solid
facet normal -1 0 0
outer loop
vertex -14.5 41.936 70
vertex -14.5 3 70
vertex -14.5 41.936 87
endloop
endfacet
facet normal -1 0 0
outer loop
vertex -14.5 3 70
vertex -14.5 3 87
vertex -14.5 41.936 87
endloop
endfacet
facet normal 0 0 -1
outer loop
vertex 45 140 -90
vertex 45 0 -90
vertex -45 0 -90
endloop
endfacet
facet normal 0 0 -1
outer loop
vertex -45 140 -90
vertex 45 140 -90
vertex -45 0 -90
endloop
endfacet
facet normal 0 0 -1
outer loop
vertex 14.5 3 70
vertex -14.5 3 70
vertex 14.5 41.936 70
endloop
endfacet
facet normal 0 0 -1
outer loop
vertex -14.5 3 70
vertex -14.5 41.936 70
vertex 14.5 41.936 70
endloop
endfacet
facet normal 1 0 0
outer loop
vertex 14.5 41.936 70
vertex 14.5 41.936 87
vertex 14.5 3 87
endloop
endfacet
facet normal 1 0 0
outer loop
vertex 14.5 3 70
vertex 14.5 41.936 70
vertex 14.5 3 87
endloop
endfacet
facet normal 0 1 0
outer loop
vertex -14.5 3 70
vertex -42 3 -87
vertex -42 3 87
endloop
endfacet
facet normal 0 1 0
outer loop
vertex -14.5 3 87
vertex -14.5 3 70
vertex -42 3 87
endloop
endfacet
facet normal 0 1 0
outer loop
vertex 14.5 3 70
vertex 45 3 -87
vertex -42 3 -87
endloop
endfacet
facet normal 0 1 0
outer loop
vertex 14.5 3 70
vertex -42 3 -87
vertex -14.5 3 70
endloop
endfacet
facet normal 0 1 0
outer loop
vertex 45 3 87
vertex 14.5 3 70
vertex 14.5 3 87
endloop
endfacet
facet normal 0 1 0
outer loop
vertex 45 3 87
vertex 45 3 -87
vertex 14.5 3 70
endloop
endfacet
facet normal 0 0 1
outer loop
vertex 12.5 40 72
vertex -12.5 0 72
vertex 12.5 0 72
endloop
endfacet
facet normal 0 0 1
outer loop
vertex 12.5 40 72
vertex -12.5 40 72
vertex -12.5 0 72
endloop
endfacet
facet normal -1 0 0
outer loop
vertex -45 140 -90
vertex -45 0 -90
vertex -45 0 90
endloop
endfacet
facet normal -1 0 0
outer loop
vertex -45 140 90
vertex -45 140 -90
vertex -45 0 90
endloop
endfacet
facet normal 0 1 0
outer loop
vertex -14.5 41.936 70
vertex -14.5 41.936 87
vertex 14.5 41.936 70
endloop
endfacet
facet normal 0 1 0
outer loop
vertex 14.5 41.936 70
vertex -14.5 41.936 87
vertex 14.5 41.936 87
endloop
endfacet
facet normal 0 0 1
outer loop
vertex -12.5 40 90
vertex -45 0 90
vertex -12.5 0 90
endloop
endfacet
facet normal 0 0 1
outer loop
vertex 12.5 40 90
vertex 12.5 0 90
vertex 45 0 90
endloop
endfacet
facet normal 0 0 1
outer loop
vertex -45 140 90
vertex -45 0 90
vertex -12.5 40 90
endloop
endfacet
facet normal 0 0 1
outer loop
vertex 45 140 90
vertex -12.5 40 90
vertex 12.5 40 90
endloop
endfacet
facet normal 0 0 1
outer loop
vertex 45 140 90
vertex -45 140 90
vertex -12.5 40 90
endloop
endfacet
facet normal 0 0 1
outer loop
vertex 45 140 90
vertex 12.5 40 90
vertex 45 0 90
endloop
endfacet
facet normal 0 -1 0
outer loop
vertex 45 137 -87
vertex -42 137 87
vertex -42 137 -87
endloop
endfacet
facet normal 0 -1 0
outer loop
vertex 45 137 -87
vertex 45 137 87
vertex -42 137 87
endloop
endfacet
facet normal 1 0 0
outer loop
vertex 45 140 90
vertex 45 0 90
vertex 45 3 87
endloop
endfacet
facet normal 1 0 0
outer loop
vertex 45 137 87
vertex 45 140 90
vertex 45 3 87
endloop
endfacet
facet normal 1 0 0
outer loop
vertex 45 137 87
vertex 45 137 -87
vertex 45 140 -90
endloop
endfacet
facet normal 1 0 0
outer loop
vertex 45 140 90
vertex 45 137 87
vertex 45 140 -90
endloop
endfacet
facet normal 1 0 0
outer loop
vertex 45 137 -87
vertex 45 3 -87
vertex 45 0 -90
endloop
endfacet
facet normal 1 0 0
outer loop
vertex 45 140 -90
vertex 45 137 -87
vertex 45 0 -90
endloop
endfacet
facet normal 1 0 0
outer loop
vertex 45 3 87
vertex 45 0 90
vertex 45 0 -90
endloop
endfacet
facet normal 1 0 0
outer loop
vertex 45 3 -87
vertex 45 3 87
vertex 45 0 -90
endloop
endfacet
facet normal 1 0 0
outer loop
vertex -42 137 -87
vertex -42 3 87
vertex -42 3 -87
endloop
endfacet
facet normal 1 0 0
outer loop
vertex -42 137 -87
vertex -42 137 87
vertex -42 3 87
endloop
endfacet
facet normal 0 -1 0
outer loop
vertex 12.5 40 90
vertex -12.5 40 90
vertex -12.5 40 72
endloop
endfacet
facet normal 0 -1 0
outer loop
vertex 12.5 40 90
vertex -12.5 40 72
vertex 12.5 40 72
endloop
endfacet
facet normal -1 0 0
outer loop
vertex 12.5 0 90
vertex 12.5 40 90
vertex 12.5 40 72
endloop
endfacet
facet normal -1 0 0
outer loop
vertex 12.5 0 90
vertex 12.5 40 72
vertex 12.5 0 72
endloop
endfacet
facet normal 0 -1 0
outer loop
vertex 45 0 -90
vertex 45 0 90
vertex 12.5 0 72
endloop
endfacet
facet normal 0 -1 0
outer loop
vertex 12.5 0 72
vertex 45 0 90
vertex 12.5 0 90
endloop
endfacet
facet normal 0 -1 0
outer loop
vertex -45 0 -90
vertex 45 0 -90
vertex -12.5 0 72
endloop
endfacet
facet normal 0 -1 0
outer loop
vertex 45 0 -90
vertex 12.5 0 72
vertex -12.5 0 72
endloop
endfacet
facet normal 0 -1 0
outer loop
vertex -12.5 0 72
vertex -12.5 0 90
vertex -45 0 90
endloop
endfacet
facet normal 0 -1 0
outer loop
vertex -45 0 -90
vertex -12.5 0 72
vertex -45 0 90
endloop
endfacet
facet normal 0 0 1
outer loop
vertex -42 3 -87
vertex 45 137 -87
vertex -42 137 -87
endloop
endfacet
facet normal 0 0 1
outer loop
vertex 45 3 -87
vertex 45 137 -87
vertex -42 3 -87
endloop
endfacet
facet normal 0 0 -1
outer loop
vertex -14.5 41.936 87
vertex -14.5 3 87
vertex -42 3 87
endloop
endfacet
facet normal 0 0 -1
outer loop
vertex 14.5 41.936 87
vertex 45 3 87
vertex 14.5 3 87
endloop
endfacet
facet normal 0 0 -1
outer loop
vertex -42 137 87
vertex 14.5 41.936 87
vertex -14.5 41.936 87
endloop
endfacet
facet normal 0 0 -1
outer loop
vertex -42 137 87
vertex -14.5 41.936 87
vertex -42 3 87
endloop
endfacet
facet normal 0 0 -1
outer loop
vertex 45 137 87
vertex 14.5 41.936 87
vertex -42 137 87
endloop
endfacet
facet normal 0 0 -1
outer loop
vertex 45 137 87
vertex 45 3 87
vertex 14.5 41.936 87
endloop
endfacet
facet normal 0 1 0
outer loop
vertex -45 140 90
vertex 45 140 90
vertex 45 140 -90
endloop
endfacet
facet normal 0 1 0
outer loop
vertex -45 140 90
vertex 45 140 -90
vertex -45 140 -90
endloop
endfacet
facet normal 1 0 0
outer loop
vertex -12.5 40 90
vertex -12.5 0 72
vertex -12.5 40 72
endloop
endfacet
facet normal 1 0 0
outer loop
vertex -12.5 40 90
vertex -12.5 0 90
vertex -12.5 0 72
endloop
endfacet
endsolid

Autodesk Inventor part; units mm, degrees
ref_plane "YZ Plane" through (0, 0, 0) normal (1, 0, 0) x (0, 1, 0)
ref_plane "XZ Plane" through (0, 0, 0) normal (0, 1, 0) x (-1, 0, 0)
ref_plane "XY Plane" through (0, 0, 0) normal (0, 0, 1) x (1, 0, 0)
sketch "Sketch1" plane through (0, 0, 0) normal (0, 1, 0) x (-1, 0, 0)
  line L0 (45, 90) -> (-45, 90)
  line L1 (-45, 90) -> (-45, -90)
  line L2 (-45, -90) -> (45, -90)
  line L3 (45, -90) -> (45, 90)
  point P0 (0, 0)
  dimension "d0" = 180
  dimension "d1" = 90
  dimension "d2" = 45
  dimension "d3" = 90
extrude "Extrusion1" add sketch "Sketch1" along normal blind 140
sketch "Sketch2" plane through (45, 0, 90) normal (1, 0, 0) x (0, 0, -1)
  line L0 (3, 137) -> (177, 137)
  line L1 (177, 137) -> (177, 3)
  line L2 (177, 3) -> (3, 3)
  line L3 (3, 3) -> (3, 137)
  line L4 (0, 140) -> (180, 140) projected
  line L5 (0, 0) -> (0, 140) projected
  point P0 (90, 0)
  dimension "d6" = 3
  dimension "d7" = 3
  dimension "d8" = 174
  dimension "d9" = 134
extrude "Extrusion2" cut sketch "Sketch2" against normal blind 87
sketch "Sketch3" plane through (-45, 0, 90) normal (0, 0, 1) x (1, 0, 0)
  line L0 (90, 0) -> (0, 0) projected
  line L1 (32.5, 40) -> (57.5, 40)
  line L2 (57.5, 40) -> (57.5, 0)
  line L3 (57.5, 0) -> (32.5, 0)
  line L4 (32.5, 0) -> (32.5, 40)
  line L5 (90, 0) -> (90, 140) projected
  point P0 (45, 0)
  point P1 (57.5, 20)
  point P2 (32.5, 20)
  dimension "d12" = 25
  dimension "d13" = 32.5
  dimension "d14" = 40
sketch "Sketch4" plane through (-45, 0, 90) normal (0, 0, 1) x (1, 0, 0)
  line L0 (90, 0) -> (0, 0) projected
  line L1 (30.5, 41.9359) -> (59.5, 41.9359)
  line L2 (59.5, 41.9359) -> (59.5, 0)
  line L3 (59.5, 0) -> (30.5, 0)
  line L4 (30.5, 0) -> (30.5, 41.9359)
  line L5 (90, 0) -> (90, 140) projected
  point P0 (45, 0)
  dimension "d15" = 29
  dimension "d16" = 30.5
extrude "Extrusion3" add sketch "Sketch4" against normal blind 20
extrude "Extrusion4" cut sketch "Sketch3" against normal blind 18
properties part number "Self_balancing_robot"
